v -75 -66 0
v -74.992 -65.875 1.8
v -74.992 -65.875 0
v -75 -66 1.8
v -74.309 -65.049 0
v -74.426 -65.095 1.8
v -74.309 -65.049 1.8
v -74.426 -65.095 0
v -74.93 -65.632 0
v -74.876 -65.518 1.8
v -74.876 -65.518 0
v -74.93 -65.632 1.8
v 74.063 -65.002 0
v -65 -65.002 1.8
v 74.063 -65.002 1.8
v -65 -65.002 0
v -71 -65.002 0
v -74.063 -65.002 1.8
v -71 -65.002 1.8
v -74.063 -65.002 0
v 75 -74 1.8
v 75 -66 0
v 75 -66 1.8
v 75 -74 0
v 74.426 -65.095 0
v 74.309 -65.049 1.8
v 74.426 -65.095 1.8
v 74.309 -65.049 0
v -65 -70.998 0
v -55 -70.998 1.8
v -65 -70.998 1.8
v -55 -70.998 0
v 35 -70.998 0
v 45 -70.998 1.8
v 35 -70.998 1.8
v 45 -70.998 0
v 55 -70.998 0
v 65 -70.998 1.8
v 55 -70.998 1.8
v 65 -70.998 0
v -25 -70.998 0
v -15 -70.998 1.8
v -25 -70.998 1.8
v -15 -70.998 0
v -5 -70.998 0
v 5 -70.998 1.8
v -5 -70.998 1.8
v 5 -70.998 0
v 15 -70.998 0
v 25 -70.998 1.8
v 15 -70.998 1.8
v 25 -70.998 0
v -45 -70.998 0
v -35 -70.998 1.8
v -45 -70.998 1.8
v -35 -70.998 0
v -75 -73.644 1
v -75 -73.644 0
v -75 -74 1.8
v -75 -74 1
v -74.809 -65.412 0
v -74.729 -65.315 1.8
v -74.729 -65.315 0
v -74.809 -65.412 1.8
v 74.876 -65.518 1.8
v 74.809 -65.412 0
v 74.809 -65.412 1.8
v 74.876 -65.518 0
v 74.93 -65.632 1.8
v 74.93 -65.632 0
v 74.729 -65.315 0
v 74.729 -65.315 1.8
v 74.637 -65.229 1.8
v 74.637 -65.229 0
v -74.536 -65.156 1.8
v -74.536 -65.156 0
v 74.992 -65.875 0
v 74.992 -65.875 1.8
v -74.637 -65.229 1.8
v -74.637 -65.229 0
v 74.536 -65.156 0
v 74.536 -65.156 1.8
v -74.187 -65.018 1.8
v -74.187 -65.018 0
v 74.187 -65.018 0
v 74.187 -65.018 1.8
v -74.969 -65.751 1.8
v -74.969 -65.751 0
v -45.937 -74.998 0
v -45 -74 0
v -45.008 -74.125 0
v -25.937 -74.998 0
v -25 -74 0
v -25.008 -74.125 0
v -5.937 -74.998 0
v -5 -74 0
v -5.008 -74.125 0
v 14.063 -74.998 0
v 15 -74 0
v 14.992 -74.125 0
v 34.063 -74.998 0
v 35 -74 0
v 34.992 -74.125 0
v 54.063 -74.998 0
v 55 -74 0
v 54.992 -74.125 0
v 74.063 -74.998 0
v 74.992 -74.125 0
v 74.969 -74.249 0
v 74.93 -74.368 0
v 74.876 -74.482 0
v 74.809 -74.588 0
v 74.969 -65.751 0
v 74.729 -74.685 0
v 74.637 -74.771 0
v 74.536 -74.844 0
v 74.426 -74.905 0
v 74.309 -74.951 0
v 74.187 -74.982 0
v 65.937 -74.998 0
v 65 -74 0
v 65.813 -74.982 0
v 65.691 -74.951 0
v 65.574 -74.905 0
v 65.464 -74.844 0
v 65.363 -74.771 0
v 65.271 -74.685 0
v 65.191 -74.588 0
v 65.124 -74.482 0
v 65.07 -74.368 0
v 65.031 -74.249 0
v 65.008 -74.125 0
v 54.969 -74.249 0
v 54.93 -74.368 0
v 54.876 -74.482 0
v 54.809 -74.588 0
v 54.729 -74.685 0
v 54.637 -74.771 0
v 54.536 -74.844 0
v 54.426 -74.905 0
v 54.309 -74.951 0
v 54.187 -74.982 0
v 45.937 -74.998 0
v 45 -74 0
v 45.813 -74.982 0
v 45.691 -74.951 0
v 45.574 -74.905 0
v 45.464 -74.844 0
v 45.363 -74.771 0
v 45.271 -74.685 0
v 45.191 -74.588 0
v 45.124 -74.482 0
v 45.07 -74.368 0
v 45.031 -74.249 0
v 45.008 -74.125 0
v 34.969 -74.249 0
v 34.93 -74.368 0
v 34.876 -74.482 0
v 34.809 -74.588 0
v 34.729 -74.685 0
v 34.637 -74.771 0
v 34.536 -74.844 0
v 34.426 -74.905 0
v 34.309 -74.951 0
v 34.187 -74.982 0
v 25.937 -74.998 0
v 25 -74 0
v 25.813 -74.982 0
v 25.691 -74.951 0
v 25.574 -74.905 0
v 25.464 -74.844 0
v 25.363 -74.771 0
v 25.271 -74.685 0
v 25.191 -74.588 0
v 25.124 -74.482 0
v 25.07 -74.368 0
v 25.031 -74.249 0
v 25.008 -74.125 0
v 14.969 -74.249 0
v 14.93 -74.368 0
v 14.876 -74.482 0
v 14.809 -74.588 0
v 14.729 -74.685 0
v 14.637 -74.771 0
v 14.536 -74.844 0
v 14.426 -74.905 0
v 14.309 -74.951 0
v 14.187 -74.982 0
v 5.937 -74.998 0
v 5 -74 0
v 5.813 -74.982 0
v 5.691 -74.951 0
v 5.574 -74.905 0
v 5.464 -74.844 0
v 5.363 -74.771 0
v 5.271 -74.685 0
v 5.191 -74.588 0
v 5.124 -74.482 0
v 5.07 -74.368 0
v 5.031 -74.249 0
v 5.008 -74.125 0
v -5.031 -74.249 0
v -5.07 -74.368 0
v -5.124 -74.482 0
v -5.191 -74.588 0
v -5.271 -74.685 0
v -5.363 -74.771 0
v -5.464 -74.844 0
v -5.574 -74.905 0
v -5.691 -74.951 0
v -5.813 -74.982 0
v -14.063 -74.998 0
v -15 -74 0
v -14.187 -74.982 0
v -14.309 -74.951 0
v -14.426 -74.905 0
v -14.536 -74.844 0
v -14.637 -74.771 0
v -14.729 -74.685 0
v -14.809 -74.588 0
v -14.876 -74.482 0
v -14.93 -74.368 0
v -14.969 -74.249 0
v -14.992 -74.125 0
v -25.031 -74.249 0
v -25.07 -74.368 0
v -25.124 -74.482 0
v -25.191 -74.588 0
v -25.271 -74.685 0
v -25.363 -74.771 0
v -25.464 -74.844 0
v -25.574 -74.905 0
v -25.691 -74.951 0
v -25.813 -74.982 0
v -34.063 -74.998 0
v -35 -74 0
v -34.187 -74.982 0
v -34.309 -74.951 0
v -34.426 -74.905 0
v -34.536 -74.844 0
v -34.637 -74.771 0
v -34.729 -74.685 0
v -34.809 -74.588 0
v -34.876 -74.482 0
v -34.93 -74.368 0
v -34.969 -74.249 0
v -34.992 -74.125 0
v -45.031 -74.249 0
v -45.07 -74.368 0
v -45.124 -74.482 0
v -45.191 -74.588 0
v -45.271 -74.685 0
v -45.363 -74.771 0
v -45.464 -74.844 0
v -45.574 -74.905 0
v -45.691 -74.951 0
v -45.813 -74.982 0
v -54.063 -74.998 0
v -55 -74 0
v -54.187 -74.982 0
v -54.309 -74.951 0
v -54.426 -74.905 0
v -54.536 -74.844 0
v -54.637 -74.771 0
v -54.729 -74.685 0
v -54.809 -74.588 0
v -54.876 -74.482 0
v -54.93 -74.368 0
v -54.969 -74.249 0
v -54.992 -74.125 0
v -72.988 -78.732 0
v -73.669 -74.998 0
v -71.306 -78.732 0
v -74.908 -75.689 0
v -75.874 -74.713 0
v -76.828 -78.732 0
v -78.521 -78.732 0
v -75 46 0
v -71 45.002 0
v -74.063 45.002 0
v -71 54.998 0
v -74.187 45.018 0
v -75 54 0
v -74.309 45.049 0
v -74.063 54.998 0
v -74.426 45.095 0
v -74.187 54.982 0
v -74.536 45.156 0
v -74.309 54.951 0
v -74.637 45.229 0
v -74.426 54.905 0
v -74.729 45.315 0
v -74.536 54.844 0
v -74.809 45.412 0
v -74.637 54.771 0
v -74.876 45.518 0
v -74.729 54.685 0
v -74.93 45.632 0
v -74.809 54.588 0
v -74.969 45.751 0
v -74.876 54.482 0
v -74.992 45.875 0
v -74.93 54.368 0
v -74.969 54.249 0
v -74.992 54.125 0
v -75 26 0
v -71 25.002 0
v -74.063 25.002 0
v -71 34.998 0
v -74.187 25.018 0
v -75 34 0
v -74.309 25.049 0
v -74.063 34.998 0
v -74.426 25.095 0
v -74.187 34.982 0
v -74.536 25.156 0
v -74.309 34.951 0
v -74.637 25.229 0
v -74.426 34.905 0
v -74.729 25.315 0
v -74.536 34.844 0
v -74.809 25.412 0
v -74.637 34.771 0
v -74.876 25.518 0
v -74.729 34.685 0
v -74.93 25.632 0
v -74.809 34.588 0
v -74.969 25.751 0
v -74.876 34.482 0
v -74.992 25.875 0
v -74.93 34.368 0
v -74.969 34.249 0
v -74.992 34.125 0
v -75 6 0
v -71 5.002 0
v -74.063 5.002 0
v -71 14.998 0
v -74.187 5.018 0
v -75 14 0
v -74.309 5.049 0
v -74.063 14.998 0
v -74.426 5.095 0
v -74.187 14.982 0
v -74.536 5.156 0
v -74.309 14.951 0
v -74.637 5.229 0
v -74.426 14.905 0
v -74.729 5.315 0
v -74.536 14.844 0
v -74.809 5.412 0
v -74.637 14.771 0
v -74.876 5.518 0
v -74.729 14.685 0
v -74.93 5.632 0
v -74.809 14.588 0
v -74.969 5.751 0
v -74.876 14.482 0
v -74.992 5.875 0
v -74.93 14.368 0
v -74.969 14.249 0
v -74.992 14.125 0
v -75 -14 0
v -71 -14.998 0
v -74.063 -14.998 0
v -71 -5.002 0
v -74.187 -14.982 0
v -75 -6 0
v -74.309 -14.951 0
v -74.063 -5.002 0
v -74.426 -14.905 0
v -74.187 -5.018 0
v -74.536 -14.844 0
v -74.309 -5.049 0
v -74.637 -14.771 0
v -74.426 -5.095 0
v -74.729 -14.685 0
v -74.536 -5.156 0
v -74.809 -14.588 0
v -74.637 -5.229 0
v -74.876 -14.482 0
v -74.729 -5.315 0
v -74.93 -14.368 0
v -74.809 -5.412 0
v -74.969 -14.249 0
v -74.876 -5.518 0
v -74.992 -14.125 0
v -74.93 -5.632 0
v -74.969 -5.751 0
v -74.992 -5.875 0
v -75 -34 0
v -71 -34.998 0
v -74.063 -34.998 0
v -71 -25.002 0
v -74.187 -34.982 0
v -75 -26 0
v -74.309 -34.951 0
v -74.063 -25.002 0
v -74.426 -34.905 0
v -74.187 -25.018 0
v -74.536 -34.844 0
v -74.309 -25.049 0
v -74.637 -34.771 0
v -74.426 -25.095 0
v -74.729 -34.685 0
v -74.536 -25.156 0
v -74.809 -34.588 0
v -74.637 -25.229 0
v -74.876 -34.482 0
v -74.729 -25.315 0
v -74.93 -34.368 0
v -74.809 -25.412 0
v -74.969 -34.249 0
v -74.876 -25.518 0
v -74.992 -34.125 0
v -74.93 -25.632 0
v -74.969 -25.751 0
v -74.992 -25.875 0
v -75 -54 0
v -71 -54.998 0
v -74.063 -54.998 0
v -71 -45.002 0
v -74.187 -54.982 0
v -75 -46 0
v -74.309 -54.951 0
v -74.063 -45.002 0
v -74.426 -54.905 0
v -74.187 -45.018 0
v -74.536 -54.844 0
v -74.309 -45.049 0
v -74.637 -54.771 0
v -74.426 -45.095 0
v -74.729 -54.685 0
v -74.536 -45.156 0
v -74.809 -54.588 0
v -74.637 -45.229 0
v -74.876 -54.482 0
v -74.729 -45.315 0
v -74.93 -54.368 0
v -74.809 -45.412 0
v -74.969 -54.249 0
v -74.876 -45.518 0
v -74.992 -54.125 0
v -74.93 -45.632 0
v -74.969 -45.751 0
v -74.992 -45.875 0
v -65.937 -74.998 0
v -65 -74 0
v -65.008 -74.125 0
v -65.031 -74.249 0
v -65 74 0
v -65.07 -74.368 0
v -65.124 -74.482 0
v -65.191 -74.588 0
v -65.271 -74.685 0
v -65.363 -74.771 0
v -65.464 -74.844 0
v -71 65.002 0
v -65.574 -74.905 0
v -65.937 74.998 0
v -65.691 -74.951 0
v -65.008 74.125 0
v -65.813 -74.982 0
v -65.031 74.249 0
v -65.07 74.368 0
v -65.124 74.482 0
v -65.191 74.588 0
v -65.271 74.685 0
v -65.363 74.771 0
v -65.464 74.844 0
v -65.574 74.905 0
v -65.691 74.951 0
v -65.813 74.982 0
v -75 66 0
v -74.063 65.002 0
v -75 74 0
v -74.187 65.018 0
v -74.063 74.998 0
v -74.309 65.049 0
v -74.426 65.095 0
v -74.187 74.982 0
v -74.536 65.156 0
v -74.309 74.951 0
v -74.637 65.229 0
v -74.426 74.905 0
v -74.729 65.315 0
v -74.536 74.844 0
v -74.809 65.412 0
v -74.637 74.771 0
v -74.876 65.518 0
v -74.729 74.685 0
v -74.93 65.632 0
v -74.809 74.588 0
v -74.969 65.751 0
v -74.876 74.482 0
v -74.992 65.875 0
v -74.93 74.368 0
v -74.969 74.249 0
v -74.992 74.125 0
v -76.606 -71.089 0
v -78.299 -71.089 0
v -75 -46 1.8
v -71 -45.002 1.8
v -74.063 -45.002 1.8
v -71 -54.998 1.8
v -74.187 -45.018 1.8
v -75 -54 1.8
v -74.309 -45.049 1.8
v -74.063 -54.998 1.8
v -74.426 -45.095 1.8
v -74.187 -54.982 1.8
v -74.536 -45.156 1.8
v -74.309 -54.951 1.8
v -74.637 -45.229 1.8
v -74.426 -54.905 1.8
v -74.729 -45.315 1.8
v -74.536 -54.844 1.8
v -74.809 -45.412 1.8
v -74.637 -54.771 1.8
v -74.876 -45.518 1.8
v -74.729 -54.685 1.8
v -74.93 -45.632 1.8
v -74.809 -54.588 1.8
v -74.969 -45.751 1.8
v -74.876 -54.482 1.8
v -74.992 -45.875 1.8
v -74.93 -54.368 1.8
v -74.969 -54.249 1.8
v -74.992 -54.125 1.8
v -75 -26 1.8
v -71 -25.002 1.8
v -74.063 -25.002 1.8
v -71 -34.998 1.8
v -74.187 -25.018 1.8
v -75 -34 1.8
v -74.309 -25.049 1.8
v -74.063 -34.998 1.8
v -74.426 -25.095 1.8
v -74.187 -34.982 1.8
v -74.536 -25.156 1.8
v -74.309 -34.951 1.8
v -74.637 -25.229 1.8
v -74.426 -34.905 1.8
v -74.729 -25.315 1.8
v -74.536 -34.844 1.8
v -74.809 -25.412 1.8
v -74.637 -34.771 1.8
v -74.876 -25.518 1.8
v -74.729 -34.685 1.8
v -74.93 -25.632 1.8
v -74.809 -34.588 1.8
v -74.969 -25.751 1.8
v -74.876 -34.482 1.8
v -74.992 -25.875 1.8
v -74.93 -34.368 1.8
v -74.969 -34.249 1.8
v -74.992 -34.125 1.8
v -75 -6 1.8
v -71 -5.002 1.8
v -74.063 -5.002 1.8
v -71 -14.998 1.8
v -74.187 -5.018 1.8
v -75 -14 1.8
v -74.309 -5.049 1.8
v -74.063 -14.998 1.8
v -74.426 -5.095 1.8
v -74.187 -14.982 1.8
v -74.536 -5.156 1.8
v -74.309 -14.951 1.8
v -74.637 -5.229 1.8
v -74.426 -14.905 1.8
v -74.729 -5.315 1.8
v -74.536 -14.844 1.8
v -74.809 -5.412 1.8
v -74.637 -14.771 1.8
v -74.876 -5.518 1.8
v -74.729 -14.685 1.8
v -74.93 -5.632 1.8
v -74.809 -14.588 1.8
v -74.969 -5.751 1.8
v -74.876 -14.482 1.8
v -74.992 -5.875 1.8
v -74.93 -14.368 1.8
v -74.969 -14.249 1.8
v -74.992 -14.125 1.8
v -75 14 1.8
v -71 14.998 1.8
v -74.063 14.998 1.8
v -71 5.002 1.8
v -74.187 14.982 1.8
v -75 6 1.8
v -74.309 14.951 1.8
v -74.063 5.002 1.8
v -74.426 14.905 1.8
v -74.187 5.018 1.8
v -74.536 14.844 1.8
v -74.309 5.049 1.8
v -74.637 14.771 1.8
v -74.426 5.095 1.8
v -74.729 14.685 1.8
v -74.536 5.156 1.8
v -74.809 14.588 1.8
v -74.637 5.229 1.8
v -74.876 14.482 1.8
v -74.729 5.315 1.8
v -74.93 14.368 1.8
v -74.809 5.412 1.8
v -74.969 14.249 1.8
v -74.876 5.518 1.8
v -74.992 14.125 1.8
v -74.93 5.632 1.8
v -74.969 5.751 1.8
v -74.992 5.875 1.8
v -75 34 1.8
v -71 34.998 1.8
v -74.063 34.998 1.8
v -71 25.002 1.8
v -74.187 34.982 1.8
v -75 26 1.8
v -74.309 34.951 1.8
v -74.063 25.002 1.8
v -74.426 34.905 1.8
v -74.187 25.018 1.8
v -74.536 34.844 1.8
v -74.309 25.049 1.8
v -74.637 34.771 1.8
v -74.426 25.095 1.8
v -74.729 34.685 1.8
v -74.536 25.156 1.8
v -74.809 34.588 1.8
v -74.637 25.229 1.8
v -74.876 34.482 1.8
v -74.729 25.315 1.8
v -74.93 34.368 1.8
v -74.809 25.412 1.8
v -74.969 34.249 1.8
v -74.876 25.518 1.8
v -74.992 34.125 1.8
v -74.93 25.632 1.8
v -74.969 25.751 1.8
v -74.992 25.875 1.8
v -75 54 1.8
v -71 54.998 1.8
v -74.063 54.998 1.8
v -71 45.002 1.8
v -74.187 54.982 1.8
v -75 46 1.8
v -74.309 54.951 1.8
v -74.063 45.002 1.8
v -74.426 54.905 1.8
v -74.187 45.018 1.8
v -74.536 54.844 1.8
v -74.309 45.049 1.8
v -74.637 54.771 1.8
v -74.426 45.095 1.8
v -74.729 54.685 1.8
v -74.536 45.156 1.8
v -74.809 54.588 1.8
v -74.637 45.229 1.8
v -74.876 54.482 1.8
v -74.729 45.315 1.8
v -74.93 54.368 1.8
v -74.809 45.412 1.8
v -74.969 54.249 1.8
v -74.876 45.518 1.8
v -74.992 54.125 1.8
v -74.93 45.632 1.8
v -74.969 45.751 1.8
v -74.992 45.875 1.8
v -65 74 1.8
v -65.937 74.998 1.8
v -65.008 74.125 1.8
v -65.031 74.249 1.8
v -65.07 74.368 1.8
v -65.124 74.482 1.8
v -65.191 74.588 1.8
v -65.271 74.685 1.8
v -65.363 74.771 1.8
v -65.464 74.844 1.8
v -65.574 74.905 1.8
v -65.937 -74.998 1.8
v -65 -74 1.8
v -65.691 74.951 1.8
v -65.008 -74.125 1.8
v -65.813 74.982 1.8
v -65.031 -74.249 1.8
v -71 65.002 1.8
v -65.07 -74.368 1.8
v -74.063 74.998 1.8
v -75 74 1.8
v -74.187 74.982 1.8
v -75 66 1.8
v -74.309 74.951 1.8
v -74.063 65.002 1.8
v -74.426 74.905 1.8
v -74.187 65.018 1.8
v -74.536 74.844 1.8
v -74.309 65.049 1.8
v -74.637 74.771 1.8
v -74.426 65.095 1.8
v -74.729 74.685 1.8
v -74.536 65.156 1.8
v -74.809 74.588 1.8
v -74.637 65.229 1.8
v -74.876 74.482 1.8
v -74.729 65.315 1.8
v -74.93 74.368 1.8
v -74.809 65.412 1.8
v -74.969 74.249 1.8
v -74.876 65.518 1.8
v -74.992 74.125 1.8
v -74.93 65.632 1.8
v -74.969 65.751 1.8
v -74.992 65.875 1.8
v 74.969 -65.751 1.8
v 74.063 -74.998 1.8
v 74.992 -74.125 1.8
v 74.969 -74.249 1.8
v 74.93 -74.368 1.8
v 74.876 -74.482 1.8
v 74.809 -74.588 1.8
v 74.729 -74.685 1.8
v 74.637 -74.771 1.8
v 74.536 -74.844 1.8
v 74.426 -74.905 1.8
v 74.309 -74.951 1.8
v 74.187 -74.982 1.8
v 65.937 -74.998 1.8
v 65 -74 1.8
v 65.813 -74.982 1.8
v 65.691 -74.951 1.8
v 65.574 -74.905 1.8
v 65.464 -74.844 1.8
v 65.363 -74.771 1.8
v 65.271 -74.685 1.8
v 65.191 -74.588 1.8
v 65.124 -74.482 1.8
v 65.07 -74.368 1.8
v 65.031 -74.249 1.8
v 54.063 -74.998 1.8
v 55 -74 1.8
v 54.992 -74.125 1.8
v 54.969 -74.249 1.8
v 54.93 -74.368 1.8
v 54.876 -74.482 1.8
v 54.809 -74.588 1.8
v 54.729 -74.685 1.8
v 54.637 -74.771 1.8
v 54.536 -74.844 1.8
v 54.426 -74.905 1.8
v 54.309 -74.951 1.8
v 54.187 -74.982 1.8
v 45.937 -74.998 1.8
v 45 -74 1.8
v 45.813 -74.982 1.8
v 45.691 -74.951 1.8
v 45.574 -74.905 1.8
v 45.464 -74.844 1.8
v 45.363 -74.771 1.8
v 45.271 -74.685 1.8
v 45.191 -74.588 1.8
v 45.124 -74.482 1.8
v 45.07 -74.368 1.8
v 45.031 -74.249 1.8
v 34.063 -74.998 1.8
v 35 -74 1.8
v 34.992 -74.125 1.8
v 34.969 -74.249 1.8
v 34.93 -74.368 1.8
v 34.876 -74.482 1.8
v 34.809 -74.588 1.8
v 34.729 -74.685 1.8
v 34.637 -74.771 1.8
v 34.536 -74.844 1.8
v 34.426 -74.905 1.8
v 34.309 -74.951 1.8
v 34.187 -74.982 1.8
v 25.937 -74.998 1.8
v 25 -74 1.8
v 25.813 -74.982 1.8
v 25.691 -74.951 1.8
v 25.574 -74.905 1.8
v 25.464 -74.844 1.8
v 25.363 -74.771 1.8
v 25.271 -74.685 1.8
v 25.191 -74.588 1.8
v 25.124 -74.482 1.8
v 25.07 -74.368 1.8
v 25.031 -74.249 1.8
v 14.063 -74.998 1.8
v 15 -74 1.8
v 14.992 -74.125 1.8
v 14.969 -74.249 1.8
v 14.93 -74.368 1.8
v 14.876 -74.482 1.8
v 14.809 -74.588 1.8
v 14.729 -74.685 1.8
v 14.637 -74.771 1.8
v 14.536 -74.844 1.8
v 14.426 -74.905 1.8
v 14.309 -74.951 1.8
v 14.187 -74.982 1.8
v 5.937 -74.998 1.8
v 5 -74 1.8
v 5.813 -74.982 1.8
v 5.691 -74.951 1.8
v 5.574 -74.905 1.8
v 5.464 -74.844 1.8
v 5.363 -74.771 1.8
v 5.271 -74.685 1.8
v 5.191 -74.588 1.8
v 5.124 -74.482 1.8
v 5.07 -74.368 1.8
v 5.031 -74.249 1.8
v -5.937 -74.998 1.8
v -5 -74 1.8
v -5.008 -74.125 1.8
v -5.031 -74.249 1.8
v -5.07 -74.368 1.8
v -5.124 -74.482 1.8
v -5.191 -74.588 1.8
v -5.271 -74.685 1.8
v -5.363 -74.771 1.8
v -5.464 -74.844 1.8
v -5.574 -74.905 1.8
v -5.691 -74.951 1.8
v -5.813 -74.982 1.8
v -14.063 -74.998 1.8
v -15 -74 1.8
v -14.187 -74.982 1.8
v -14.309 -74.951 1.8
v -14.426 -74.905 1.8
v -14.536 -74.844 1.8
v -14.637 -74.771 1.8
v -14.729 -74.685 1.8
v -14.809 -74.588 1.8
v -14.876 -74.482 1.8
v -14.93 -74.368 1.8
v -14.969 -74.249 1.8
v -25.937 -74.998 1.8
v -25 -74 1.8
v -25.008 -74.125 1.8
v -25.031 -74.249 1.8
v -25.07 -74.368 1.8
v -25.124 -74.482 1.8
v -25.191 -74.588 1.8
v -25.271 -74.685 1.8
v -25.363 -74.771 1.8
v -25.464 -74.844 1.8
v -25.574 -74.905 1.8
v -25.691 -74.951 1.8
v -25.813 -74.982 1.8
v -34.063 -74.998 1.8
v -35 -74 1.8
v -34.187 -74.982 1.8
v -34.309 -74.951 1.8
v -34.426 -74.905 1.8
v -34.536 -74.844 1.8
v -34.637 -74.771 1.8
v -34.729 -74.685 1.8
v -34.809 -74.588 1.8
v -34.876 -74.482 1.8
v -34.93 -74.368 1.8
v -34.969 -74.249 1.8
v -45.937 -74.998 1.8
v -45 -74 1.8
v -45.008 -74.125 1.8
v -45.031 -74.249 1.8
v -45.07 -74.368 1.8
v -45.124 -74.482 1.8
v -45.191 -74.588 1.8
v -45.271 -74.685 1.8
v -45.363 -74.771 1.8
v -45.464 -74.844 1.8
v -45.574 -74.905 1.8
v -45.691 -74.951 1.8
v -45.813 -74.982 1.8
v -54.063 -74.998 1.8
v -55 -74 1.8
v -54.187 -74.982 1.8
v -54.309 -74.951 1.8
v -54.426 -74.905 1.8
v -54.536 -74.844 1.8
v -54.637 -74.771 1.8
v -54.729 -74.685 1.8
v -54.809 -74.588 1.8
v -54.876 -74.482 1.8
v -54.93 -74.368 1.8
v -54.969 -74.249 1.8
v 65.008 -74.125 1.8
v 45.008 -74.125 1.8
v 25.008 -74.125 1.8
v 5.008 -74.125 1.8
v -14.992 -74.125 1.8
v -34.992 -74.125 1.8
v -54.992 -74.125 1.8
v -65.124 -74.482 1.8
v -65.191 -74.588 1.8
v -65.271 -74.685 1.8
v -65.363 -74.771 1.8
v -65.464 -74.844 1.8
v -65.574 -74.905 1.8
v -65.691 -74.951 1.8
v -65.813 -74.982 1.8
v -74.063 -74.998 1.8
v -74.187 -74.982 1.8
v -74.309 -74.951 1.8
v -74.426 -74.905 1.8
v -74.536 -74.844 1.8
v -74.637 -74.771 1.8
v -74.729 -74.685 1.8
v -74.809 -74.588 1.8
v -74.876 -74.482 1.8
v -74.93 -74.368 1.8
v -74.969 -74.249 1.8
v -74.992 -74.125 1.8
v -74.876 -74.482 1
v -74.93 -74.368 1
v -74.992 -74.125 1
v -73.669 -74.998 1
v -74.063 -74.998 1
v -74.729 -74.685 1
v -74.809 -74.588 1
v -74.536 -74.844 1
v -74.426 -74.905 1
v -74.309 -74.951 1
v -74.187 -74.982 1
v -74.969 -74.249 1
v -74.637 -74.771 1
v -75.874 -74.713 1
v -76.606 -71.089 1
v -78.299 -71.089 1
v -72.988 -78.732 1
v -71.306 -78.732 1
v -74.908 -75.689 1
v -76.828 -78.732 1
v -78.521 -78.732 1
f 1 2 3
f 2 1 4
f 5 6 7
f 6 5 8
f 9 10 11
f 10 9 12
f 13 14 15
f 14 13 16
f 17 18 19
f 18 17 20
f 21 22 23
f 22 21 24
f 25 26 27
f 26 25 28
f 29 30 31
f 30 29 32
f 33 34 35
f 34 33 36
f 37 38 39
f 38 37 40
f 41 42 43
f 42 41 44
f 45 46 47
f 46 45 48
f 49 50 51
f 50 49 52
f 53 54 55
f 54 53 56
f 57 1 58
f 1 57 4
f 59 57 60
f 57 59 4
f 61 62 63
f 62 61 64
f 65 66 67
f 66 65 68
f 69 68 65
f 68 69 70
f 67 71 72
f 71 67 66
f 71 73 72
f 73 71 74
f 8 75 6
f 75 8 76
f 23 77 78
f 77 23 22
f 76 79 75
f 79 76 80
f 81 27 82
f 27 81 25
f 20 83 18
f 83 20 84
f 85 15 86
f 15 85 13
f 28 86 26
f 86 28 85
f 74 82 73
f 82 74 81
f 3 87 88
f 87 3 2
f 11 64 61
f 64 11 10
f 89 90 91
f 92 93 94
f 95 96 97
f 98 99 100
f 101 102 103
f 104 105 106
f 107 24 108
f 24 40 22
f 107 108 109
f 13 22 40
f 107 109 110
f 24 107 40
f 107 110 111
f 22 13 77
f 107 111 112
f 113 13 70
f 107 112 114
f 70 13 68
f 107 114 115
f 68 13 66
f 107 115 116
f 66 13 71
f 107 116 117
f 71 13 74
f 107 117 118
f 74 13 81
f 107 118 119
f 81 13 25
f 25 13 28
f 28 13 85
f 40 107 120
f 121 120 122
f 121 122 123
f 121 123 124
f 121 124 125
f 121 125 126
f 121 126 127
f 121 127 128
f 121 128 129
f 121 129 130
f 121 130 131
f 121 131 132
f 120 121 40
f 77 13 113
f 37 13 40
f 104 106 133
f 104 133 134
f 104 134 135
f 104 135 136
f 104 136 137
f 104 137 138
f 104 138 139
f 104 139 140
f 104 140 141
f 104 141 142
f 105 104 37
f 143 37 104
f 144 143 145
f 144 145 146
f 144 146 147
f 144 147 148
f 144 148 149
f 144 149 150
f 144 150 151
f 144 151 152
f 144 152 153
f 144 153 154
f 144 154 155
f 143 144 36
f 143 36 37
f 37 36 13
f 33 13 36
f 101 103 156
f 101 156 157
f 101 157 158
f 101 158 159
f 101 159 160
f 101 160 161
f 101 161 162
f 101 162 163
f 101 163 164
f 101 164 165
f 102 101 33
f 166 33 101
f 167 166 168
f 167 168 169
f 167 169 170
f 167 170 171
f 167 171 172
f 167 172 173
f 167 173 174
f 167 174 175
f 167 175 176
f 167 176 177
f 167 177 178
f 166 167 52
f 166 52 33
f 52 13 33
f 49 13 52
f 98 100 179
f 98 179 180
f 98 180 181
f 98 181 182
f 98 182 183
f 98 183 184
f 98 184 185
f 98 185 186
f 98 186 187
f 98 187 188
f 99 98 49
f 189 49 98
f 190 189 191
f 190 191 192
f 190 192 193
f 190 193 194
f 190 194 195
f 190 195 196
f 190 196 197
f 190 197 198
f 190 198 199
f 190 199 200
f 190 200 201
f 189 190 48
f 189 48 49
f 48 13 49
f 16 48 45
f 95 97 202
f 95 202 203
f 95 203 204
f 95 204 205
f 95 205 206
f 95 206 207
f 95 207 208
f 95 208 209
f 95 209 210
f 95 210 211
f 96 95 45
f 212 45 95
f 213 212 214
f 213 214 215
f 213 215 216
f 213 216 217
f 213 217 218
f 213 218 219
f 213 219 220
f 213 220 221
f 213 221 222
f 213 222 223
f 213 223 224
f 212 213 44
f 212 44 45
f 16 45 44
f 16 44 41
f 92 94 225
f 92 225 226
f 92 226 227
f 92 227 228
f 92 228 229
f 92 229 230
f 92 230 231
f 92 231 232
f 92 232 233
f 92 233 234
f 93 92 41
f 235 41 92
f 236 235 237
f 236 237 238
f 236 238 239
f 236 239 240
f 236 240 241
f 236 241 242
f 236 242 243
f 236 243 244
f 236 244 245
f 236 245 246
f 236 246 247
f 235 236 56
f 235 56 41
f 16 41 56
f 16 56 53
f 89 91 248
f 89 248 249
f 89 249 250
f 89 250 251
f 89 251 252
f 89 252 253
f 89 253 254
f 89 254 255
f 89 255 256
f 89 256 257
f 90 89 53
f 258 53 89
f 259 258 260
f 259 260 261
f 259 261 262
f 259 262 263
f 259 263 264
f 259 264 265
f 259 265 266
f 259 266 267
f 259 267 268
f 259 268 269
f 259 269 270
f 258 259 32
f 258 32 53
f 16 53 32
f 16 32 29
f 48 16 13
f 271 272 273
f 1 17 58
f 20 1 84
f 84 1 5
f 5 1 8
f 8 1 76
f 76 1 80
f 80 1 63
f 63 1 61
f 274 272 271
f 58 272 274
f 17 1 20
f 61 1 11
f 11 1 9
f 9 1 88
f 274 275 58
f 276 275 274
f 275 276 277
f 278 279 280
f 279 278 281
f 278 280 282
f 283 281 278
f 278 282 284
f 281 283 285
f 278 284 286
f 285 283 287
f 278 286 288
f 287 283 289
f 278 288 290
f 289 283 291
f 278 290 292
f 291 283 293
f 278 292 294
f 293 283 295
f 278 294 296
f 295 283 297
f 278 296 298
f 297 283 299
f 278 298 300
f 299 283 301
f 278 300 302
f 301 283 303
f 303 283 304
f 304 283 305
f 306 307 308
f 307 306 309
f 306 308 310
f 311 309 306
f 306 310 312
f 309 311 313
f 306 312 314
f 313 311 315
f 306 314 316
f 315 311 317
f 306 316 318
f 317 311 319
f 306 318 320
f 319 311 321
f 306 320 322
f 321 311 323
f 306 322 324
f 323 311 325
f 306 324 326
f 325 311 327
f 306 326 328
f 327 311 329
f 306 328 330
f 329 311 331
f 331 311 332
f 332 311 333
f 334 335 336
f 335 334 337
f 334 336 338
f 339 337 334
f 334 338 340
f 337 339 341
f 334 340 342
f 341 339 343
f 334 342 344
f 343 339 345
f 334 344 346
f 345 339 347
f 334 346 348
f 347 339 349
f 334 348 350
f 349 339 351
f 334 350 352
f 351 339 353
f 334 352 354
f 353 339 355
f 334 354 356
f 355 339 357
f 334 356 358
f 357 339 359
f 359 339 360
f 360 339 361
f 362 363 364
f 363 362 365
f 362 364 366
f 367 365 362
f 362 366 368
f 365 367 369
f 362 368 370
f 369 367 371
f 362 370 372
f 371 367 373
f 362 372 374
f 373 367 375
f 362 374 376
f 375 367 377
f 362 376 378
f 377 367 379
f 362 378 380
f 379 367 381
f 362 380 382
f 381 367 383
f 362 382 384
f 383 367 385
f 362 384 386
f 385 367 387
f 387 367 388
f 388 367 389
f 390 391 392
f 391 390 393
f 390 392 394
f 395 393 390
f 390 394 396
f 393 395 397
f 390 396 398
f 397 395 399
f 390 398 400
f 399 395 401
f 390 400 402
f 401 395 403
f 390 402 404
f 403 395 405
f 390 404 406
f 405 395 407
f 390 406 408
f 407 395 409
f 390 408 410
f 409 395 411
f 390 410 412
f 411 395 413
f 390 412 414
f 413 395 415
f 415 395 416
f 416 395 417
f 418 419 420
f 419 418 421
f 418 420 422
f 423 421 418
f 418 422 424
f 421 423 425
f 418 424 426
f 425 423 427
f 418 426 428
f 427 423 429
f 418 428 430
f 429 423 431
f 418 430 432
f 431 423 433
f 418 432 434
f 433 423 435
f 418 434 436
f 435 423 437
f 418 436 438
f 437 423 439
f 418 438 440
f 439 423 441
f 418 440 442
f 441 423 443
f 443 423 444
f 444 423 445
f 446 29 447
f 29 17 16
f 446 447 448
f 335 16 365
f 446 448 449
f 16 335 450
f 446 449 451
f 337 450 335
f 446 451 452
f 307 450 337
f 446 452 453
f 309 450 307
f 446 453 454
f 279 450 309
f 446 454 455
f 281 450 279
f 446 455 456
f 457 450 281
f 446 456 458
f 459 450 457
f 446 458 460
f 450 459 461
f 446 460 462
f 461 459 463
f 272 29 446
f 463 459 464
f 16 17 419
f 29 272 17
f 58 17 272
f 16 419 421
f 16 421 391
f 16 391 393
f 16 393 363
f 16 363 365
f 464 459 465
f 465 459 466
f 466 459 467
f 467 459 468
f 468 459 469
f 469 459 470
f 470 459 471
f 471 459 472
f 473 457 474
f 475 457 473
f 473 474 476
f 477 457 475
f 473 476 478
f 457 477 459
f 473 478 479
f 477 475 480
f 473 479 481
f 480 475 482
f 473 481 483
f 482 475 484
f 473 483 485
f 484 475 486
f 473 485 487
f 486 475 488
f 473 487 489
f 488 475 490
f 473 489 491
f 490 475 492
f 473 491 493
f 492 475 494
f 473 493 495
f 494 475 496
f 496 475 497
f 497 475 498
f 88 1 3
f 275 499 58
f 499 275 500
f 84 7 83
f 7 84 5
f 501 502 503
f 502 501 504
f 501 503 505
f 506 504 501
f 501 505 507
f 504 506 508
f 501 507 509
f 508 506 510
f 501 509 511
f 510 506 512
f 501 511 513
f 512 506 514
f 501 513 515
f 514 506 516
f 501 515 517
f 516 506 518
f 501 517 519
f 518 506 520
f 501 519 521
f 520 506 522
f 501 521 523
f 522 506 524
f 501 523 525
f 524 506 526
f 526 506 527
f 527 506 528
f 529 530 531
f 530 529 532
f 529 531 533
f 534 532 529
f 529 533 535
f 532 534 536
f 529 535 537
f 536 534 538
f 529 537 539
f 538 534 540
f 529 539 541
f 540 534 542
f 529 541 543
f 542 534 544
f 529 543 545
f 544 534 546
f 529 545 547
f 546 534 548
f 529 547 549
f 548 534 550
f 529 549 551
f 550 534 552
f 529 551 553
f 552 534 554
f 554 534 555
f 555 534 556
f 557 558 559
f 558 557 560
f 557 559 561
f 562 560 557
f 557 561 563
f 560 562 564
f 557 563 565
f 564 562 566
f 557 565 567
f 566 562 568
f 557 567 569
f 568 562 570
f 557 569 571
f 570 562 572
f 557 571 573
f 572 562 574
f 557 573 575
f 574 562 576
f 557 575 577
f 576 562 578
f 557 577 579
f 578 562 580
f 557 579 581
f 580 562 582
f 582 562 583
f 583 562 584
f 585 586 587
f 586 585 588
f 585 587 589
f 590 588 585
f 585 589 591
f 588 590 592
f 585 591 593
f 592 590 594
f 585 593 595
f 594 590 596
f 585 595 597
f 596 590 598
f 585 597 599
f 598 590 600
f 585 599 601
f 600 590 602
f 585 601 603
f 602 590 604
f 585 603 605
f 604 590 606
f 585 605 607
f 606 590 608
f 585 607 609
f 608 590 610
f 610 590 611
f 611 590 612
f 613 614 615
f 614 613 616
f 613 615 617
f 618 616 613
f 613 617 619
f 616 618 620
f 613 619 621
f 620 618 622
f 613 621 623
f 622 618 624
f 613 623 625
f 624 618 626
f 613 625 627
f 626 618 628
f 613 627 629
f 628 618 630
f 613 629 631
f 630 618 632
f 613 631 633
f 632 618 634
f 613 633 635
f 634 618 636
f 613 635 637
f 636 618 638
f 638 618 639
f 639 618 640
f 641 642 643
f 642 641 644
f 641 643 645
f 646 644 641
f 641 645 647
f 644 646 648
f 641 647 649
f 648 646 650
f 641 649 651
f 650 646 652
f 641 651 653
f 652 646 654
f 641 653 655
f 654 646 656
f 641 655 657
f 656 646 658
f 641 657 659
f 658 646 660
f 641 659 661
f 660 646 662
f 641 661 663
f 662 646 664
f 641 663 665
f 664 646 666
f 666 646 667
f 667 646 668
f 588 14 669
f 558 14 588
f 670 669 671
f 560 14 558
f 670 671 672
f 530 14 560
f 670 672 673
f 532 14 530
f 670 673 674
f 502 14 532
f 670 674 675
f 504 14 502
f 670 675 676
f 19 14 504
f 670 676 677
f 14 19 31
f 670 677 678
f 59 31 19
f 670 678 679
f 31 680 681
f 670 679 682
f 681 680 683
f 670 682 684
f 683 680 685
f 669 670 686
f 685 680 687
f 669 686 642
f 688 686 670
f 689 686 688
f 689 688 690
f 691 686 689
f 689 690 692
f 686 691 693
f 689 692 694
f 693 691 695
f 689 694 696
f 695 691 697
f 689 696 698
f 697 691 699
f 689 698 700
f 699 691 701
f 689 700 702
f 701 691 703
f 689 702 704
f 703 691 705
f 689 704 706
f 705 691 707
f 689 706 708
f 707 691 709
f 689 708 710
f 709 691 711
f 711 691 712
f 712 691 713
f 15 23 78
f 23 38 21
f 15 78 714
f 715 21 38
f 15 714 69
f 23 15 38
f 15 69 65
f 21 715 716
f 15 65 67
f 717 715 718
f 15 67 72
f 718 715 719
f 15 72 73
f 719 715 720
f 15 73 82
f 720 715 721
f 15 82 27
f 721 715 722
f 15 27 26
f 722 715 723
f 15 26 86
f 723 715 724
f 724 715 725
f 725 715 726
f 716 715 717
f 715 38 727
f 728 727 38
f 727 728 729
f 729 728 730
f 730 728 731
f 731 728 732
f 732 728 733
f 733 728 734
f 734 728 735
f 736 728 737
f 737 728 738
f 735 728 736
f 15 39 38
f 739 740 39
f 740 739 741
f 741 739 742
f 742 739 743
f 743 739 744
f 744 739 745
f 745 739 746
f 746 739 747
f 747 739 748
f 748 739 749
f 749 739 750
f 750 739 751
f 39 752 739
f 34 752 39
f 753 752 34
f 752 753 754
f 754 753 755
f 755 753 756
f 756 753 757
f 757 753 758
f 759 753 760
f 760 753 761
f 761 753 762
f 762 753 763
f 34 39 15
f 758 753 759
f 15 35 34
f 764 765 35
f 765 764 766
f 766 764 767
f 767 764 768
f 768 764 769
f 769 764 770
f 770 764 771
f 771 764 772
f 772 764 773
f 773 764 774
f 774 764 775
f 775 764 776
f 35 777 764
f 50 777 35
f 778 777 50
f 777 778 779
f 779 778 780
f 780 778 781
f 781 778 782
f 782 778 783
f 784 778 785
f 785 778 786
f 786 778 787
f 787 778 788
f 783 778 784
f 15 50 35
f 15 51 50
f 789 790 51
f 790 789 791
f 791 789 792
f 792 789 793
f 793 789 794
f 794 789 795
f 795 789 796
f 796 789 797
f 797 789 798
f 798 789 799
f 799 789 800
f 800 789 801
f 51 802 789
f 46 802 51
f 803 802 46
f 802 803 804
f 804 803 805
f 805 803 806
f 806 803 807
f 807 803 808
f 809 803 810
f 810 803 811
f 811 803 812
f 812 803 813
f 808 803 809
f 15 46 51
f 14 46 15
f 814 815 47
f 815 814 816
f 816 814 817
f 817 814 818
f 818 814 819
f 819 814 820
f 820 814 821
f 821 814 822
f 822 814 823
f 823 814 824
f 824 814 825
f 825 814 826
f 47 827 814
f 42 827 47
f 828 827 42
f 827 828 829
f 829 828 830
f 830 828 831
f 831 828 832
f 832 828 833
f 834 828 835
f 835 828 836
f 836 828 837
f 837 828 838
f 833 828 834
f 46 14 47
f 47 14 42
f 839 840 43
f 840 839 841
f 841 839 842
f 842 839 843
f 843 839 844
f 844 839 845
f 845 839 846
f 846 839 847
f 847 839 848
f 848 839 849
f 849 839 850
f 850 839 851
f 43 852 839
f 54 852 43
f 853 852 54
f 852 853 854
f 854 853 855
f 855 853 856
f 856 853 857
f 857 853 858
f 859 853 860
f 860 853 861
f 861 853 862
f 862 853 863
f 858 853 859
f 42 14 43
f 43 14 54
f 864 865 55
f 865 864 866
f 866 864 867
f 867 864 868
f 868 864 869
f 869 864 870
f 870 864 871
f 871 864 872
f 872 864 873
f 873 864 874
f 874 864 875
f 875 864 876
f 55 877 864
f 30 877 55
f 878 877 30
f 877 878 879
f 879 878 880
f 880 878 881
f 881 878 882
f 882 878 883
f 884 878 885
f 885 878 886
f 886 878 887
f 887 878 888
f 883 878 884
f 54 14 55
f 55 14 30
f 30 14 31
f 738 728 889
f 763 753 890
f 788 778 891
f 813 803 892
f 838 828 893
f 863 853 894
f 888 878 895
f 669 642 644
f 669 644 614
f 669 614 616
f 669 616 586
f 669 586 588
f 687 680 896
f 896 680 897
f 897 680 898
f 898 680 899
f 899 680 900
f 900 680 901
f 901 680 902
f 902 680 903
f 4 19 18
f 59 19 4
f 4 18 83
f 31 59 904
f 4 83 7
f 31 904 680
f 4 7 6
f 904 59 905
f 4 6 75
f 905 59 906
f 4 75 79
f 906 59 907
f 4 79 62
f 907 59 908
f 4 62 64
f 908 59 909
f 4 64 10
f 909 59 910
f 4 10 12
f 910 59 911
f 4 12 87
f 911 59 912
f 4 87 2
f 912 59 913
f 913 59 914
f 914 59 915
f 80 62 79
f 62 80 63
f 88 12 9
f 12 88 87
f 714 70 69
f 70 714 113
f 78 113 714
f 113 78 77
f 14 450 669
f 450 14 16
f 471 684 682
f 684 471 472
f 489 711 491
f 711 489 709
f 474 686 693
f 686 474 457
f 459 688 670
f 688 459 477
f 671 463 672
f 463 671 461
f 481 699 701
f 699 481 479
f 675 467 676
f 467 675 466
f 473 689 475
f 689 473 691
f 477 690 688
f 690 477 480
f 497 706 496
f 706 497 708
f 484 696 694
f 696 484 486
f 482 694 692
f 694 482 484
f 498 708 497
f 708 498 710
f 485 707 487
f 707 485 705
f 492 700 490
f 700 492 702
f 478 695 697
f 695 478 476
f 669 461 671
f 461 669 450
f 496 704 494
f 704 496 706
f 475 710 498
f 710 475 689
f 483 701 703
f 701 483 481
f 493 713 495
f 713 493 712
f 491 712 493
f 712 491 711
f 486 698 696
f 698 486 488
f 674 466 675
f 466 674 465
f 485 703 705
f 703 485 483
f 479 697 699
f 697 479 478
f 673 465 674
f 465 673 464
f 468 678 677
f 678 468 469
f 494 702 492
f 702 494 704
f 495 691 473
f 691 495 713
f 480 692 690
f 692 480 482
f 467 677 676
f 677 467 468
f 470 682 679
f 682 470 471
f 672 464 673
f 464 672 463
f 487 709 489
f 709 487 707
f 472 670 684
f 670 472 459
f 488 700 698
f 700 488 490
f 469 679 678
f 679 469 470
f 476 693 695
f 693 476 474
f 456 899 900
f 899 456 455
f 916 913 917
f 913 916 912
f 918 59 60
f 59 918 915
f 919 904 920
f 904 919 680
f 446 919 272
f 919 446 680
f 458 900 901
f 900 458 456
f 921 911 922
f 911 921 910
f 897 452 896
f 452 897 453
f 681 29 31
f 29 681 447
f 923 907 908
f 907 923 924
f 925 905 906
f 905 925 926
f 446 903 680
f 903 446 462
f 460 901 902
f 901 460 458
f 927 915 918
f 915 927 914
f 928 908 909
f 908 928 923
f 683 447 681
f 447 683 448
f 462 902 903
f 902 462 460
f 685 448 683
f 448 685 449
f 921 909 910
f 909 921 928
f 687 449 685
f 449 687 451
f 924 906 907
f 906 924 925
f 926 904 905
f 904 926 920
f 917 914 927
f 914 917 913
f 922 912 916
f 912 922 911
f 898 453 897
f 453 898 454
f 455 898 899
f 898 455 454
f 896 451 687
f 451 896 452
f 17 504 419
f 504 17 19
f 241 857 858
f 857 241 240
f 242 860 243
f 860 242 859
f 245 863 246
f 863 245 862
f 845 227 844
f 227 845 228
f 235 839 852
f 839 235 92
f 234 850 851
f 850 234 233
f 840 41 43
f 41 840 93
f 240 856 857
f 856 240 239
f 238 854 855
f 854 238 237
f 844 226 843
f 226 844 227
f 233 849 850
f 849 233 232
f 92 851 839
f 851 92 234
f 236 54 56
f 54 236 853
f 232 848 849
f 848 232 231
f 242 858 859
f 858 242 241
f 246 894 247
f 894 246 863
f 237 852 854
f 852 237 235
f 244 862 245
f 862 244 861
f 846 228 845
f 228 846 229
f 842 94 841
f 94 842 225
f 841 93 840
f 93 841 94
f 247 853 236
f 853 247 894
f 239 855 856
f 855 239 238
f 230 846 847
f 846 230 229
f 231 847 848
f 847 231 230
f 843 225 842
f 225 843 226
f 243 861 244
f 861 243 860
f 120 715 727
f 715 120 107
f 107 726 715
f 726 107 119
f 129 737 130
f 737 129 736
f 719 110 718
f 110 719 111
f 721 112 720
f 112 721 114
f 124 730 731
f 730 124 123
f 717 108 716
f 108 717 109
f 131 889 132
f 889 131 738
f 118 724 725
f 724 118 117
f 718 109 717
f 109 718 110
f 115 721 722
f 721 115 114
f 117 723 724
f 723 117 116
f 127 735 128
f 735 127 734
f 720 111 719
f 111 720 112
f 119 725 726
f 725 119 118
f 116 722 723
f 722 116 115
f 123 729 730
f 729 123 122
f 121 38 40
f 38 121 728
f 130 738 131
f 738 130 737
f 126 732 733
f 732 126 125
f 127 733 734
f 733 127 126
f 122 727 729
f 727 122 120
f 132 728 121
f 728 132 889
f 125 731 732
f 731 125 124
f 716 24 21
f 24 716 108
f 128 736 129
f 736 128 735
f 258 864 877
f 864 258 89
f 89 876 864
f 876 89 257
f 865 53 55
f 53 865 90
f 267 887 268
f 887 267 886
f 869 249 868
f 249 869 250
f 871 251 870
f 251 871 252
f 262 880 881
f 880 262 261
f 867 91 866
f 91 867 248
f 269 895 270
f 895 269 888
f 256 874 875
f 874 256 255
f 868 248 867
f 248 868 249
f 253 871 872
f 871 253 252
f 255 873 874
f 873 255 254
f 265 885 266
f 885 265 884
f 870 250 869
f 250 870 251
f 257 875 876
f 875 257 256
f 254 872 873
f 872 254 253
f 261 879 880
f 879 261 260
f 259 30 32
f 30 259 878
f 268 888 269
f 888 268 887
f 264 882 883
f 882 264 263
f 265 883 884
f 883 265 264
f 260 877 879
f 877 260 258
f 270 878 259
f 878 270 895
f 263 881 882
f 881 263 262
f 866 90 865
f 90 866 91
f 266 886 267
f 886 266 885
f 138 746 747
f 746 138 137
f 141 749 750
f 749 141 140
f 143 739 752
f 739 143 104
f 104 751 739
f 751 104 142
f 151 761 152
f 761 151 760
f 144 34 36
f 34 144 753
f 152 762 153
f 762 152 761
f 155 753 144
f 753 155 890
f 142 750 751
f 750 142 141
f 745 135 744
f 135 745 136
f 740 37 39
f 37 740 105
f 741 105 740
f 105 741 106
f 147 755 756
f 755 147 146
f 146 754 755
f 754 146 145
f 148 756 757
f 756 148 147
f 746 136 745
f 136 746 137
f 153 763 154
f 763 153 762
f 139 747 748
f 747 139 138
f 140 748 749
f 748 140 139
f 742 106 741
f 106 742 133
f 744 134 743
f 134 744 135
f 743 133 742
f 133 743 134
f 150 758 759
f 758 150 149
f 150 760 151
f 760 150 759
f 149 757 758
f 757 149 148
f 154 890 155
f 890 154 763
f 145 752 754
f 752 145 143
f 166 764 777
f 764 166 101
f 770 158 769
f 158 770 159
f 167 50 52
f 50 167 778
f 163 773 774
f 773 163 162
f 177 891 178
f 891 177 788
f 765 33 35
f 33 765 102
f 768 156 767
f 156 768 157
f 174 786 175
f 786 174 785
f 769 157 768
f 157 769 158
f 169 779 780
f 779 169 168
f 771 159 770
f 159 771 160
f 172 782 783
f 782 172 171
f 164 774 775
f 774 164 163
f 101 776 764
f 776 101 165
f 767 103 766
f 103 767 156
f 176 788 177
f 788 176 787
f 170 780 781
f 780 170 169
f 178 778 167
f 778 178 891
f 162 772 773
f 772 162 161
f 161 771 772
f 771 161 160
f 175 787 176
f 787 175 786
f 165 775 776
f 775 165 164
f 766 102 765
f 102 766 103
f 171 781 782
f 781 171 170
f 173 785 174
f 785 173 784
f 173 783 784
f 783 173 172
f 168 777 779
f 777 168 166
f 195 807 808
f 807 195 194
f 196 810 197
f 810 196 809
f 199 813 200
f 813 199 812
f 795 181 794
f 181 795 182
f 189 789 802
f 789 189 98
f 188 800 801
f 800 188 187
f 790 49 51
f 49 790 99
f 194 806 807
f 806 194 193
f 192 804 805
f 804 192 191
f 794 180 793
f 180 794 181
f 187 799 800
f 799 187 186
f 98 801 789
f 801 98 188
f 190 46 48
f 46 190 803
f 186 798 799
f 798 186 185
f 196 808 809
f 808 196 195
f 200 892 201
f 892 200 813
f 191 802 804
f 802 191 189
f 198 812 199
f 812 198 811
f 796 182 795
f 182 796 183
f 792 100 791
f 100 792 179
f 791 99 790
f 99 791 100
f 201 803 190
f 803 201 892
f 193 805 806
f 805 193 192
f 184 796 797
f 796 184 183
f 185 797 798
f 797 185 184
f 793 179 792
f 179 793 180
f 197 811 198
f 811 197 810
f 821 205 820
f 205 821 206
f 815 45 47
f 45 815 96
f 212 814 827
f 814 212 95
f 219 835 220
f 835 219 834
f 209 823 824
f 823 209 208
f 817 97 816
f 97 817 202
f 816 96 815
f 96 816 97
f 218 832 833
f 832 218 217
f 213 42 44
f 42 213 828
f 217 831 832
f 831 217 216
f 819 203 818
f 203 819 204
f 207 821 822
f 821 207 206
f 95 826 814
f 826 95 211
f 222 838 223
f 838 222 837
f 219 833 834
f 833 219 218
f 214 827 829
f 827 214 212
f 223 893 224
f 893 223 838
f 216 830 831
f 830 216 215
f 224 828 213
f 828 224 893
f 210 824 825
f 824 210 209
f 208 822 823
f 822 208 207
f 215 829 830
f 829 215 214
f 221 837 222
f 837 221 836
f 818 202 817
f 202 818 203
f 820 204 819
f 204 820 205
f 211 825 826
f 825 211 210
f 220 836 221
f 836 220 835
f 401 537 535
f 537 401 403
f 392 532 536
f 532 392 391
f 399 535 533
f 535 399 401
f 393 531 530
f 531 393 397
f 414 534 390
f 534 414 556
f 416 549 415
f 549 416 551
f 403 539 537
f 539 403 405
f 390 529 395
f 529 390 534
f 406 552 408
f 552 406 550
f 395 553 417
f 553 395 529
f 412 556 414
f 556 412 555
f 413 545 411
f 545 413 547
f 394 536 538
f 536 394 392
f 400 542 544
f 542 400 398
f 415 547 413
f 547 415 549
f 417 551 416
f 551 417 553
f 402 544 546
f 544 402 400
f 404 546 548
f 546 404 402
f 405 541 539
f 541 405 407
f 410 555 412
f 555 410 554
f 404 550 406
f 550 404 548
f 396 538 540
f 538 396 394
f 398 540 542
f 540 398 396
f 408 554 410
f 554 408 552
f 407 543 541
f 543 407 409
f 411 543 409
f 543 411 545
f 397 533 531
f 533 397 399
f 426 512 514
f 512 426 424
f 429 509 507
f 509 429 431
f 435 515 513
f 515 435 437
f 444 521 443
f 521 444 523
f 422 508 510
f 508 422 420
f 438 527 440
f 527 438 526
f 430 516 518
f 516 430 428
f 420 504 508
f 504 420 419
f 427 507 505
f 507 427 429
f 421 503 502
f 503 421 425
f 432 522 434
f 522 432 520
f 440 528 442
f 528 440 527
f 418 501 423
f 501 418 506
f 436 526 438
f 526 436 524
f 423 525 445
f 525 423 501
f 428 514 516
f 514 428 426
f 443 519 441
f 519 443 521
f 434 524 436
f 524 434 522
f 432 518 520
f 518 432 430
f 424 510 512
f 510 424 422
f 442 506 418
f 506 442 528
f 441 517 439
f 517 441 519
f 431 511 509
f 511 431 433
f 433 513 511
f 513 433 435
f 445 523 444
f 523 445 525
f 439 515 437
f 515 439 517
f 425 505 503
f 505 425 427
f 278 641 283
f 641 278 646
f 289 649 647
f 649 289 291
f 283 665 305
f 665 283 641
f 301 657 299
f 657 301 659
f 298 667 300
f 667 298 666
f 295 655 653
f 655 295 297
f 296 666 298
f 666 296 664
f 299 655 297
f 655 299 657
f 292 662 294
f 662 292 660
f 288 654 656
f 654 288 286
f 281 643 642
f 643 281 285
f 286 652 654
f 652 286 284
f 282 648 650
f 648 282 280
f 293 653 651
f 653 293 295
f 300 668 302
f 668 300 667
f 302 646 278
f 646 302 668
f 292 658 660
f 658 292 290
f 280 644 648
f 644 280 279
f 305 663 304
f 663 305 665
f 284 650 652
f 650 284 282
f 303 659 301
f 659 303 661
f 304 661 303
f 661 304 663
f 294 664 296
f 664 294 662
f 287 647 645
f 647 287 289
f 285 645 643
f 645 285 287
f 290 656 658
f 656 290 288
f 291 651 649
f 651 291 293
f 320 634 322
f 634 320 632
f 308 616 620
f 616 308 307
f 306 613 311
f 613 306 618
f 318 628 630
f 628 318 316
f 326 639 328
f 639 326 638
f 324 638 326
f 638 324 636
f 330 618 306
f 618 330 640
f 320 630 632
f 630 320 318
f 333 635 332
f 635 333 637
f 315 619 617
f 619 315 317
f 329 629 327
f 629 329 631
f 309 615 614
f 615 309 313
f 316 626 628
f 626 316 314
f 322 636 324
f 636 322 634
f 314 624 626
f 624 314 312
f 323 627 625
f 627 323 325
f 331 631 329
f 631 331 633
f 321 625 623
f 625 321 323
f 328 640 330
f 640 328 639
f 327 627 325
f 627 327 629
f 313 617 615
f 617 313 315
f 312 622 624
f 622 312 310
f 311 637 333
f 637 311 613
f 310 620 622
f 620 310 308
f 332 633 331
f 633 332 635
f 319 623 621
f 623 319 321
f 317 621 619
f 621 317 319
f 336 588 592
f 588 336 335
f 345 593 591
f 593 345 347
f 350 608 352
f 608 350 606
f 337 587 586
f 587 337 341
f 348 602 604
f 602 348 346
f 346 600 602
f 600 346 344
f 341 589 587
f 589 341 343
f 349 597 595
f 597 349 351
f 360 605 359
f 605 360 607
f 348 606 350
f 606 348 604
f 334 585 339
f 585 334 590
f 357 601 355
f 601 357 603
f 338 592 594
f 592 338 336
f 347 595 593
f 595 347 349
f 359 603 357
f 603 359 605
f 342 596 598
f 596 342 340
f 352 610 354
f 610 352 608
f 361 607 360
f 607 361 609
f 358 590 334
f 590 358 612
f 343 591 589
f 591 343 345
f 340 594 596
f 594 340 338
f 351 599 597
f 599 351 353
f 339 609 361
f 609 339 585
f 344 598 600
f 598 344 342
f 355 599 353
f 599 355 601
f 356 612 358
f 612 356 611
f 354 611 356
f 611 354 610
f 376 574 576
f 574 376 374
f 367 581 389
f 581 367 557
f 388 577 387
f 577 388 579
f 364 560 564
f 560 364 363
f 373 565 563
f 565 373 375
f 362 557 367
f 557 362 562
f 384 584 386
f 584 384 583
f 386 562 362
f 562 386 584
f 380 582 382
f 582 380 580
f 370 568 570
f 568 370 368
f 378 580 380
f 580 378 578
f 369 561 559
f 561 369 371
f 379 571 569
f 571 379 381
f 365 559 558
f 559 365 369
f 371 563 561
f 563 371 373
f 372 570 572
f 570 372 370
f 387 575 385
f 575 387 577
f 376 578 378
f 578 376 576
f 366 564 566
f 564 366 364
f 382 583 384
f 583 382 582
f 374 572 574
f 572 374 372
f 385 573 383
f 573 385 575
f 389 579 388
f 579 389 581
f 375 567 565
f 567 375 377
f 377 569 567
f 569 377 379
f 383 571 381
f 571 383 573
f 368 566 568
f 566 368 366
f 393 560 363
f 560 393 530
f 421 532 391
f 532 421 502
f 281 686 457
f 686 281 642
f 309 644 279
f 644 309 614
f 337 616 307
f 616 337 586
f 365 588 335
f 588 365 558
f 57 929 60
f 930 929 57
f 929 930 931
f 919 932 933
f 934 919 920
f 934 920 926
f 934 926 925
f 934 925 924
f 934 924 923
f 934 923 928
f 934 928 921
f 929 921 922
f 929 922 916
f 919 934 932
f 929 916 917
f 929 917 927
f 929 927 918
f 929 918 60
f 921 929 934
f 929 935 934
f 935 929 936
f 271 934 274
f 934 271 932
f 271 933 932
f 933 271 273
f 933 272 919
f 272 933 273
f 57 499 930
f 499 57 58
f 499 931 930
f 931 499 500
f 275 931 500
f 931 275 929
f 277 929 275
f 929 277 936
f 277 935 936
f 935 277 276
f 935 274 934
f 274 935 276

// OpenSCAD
//------------------------------------------------------
// XY calibration test
// Simple and printable in a couple of minutes
// 5@xes 15/11/2021
//------------------------------------------------------

$fn=50;
font = "Arial:style=Bold";

// 15cm x 15cm ; 1cm steps
cm_x = 15;
cm_y = 15;

height = 0.8;
letter_height =1;
letter_size =8;

union() {
translate([-75,-75,0]) Ruler();
translate([-75,-75,0]) letter("X");
}

module Ruler() {
minkowski()
{

union() {
// X
for (i = [0 : 2 : cm_x-1]) { 
    translate([10*i+1,1,0])
        cube([8,8,height]);
}
//Y
for (j = [0 : 2 : cm_y-1]) { 
    translate([1,10*j+1,0])
        cube([8,8,height]);
}

translate([1,5,0]) cube([cm_x*10-2,4,height]);
translate([5,1,0]) cube([4, cm_y*10-2,height]);

}

  cylinder(r=1,h=1);
}
}

module letter(Txt) {
  color("Red")
  linear_extrude(height = letter_height) {
    text(Txt, size = letter_size, font = font, halign = "center", valign = "center");
  }
}                
